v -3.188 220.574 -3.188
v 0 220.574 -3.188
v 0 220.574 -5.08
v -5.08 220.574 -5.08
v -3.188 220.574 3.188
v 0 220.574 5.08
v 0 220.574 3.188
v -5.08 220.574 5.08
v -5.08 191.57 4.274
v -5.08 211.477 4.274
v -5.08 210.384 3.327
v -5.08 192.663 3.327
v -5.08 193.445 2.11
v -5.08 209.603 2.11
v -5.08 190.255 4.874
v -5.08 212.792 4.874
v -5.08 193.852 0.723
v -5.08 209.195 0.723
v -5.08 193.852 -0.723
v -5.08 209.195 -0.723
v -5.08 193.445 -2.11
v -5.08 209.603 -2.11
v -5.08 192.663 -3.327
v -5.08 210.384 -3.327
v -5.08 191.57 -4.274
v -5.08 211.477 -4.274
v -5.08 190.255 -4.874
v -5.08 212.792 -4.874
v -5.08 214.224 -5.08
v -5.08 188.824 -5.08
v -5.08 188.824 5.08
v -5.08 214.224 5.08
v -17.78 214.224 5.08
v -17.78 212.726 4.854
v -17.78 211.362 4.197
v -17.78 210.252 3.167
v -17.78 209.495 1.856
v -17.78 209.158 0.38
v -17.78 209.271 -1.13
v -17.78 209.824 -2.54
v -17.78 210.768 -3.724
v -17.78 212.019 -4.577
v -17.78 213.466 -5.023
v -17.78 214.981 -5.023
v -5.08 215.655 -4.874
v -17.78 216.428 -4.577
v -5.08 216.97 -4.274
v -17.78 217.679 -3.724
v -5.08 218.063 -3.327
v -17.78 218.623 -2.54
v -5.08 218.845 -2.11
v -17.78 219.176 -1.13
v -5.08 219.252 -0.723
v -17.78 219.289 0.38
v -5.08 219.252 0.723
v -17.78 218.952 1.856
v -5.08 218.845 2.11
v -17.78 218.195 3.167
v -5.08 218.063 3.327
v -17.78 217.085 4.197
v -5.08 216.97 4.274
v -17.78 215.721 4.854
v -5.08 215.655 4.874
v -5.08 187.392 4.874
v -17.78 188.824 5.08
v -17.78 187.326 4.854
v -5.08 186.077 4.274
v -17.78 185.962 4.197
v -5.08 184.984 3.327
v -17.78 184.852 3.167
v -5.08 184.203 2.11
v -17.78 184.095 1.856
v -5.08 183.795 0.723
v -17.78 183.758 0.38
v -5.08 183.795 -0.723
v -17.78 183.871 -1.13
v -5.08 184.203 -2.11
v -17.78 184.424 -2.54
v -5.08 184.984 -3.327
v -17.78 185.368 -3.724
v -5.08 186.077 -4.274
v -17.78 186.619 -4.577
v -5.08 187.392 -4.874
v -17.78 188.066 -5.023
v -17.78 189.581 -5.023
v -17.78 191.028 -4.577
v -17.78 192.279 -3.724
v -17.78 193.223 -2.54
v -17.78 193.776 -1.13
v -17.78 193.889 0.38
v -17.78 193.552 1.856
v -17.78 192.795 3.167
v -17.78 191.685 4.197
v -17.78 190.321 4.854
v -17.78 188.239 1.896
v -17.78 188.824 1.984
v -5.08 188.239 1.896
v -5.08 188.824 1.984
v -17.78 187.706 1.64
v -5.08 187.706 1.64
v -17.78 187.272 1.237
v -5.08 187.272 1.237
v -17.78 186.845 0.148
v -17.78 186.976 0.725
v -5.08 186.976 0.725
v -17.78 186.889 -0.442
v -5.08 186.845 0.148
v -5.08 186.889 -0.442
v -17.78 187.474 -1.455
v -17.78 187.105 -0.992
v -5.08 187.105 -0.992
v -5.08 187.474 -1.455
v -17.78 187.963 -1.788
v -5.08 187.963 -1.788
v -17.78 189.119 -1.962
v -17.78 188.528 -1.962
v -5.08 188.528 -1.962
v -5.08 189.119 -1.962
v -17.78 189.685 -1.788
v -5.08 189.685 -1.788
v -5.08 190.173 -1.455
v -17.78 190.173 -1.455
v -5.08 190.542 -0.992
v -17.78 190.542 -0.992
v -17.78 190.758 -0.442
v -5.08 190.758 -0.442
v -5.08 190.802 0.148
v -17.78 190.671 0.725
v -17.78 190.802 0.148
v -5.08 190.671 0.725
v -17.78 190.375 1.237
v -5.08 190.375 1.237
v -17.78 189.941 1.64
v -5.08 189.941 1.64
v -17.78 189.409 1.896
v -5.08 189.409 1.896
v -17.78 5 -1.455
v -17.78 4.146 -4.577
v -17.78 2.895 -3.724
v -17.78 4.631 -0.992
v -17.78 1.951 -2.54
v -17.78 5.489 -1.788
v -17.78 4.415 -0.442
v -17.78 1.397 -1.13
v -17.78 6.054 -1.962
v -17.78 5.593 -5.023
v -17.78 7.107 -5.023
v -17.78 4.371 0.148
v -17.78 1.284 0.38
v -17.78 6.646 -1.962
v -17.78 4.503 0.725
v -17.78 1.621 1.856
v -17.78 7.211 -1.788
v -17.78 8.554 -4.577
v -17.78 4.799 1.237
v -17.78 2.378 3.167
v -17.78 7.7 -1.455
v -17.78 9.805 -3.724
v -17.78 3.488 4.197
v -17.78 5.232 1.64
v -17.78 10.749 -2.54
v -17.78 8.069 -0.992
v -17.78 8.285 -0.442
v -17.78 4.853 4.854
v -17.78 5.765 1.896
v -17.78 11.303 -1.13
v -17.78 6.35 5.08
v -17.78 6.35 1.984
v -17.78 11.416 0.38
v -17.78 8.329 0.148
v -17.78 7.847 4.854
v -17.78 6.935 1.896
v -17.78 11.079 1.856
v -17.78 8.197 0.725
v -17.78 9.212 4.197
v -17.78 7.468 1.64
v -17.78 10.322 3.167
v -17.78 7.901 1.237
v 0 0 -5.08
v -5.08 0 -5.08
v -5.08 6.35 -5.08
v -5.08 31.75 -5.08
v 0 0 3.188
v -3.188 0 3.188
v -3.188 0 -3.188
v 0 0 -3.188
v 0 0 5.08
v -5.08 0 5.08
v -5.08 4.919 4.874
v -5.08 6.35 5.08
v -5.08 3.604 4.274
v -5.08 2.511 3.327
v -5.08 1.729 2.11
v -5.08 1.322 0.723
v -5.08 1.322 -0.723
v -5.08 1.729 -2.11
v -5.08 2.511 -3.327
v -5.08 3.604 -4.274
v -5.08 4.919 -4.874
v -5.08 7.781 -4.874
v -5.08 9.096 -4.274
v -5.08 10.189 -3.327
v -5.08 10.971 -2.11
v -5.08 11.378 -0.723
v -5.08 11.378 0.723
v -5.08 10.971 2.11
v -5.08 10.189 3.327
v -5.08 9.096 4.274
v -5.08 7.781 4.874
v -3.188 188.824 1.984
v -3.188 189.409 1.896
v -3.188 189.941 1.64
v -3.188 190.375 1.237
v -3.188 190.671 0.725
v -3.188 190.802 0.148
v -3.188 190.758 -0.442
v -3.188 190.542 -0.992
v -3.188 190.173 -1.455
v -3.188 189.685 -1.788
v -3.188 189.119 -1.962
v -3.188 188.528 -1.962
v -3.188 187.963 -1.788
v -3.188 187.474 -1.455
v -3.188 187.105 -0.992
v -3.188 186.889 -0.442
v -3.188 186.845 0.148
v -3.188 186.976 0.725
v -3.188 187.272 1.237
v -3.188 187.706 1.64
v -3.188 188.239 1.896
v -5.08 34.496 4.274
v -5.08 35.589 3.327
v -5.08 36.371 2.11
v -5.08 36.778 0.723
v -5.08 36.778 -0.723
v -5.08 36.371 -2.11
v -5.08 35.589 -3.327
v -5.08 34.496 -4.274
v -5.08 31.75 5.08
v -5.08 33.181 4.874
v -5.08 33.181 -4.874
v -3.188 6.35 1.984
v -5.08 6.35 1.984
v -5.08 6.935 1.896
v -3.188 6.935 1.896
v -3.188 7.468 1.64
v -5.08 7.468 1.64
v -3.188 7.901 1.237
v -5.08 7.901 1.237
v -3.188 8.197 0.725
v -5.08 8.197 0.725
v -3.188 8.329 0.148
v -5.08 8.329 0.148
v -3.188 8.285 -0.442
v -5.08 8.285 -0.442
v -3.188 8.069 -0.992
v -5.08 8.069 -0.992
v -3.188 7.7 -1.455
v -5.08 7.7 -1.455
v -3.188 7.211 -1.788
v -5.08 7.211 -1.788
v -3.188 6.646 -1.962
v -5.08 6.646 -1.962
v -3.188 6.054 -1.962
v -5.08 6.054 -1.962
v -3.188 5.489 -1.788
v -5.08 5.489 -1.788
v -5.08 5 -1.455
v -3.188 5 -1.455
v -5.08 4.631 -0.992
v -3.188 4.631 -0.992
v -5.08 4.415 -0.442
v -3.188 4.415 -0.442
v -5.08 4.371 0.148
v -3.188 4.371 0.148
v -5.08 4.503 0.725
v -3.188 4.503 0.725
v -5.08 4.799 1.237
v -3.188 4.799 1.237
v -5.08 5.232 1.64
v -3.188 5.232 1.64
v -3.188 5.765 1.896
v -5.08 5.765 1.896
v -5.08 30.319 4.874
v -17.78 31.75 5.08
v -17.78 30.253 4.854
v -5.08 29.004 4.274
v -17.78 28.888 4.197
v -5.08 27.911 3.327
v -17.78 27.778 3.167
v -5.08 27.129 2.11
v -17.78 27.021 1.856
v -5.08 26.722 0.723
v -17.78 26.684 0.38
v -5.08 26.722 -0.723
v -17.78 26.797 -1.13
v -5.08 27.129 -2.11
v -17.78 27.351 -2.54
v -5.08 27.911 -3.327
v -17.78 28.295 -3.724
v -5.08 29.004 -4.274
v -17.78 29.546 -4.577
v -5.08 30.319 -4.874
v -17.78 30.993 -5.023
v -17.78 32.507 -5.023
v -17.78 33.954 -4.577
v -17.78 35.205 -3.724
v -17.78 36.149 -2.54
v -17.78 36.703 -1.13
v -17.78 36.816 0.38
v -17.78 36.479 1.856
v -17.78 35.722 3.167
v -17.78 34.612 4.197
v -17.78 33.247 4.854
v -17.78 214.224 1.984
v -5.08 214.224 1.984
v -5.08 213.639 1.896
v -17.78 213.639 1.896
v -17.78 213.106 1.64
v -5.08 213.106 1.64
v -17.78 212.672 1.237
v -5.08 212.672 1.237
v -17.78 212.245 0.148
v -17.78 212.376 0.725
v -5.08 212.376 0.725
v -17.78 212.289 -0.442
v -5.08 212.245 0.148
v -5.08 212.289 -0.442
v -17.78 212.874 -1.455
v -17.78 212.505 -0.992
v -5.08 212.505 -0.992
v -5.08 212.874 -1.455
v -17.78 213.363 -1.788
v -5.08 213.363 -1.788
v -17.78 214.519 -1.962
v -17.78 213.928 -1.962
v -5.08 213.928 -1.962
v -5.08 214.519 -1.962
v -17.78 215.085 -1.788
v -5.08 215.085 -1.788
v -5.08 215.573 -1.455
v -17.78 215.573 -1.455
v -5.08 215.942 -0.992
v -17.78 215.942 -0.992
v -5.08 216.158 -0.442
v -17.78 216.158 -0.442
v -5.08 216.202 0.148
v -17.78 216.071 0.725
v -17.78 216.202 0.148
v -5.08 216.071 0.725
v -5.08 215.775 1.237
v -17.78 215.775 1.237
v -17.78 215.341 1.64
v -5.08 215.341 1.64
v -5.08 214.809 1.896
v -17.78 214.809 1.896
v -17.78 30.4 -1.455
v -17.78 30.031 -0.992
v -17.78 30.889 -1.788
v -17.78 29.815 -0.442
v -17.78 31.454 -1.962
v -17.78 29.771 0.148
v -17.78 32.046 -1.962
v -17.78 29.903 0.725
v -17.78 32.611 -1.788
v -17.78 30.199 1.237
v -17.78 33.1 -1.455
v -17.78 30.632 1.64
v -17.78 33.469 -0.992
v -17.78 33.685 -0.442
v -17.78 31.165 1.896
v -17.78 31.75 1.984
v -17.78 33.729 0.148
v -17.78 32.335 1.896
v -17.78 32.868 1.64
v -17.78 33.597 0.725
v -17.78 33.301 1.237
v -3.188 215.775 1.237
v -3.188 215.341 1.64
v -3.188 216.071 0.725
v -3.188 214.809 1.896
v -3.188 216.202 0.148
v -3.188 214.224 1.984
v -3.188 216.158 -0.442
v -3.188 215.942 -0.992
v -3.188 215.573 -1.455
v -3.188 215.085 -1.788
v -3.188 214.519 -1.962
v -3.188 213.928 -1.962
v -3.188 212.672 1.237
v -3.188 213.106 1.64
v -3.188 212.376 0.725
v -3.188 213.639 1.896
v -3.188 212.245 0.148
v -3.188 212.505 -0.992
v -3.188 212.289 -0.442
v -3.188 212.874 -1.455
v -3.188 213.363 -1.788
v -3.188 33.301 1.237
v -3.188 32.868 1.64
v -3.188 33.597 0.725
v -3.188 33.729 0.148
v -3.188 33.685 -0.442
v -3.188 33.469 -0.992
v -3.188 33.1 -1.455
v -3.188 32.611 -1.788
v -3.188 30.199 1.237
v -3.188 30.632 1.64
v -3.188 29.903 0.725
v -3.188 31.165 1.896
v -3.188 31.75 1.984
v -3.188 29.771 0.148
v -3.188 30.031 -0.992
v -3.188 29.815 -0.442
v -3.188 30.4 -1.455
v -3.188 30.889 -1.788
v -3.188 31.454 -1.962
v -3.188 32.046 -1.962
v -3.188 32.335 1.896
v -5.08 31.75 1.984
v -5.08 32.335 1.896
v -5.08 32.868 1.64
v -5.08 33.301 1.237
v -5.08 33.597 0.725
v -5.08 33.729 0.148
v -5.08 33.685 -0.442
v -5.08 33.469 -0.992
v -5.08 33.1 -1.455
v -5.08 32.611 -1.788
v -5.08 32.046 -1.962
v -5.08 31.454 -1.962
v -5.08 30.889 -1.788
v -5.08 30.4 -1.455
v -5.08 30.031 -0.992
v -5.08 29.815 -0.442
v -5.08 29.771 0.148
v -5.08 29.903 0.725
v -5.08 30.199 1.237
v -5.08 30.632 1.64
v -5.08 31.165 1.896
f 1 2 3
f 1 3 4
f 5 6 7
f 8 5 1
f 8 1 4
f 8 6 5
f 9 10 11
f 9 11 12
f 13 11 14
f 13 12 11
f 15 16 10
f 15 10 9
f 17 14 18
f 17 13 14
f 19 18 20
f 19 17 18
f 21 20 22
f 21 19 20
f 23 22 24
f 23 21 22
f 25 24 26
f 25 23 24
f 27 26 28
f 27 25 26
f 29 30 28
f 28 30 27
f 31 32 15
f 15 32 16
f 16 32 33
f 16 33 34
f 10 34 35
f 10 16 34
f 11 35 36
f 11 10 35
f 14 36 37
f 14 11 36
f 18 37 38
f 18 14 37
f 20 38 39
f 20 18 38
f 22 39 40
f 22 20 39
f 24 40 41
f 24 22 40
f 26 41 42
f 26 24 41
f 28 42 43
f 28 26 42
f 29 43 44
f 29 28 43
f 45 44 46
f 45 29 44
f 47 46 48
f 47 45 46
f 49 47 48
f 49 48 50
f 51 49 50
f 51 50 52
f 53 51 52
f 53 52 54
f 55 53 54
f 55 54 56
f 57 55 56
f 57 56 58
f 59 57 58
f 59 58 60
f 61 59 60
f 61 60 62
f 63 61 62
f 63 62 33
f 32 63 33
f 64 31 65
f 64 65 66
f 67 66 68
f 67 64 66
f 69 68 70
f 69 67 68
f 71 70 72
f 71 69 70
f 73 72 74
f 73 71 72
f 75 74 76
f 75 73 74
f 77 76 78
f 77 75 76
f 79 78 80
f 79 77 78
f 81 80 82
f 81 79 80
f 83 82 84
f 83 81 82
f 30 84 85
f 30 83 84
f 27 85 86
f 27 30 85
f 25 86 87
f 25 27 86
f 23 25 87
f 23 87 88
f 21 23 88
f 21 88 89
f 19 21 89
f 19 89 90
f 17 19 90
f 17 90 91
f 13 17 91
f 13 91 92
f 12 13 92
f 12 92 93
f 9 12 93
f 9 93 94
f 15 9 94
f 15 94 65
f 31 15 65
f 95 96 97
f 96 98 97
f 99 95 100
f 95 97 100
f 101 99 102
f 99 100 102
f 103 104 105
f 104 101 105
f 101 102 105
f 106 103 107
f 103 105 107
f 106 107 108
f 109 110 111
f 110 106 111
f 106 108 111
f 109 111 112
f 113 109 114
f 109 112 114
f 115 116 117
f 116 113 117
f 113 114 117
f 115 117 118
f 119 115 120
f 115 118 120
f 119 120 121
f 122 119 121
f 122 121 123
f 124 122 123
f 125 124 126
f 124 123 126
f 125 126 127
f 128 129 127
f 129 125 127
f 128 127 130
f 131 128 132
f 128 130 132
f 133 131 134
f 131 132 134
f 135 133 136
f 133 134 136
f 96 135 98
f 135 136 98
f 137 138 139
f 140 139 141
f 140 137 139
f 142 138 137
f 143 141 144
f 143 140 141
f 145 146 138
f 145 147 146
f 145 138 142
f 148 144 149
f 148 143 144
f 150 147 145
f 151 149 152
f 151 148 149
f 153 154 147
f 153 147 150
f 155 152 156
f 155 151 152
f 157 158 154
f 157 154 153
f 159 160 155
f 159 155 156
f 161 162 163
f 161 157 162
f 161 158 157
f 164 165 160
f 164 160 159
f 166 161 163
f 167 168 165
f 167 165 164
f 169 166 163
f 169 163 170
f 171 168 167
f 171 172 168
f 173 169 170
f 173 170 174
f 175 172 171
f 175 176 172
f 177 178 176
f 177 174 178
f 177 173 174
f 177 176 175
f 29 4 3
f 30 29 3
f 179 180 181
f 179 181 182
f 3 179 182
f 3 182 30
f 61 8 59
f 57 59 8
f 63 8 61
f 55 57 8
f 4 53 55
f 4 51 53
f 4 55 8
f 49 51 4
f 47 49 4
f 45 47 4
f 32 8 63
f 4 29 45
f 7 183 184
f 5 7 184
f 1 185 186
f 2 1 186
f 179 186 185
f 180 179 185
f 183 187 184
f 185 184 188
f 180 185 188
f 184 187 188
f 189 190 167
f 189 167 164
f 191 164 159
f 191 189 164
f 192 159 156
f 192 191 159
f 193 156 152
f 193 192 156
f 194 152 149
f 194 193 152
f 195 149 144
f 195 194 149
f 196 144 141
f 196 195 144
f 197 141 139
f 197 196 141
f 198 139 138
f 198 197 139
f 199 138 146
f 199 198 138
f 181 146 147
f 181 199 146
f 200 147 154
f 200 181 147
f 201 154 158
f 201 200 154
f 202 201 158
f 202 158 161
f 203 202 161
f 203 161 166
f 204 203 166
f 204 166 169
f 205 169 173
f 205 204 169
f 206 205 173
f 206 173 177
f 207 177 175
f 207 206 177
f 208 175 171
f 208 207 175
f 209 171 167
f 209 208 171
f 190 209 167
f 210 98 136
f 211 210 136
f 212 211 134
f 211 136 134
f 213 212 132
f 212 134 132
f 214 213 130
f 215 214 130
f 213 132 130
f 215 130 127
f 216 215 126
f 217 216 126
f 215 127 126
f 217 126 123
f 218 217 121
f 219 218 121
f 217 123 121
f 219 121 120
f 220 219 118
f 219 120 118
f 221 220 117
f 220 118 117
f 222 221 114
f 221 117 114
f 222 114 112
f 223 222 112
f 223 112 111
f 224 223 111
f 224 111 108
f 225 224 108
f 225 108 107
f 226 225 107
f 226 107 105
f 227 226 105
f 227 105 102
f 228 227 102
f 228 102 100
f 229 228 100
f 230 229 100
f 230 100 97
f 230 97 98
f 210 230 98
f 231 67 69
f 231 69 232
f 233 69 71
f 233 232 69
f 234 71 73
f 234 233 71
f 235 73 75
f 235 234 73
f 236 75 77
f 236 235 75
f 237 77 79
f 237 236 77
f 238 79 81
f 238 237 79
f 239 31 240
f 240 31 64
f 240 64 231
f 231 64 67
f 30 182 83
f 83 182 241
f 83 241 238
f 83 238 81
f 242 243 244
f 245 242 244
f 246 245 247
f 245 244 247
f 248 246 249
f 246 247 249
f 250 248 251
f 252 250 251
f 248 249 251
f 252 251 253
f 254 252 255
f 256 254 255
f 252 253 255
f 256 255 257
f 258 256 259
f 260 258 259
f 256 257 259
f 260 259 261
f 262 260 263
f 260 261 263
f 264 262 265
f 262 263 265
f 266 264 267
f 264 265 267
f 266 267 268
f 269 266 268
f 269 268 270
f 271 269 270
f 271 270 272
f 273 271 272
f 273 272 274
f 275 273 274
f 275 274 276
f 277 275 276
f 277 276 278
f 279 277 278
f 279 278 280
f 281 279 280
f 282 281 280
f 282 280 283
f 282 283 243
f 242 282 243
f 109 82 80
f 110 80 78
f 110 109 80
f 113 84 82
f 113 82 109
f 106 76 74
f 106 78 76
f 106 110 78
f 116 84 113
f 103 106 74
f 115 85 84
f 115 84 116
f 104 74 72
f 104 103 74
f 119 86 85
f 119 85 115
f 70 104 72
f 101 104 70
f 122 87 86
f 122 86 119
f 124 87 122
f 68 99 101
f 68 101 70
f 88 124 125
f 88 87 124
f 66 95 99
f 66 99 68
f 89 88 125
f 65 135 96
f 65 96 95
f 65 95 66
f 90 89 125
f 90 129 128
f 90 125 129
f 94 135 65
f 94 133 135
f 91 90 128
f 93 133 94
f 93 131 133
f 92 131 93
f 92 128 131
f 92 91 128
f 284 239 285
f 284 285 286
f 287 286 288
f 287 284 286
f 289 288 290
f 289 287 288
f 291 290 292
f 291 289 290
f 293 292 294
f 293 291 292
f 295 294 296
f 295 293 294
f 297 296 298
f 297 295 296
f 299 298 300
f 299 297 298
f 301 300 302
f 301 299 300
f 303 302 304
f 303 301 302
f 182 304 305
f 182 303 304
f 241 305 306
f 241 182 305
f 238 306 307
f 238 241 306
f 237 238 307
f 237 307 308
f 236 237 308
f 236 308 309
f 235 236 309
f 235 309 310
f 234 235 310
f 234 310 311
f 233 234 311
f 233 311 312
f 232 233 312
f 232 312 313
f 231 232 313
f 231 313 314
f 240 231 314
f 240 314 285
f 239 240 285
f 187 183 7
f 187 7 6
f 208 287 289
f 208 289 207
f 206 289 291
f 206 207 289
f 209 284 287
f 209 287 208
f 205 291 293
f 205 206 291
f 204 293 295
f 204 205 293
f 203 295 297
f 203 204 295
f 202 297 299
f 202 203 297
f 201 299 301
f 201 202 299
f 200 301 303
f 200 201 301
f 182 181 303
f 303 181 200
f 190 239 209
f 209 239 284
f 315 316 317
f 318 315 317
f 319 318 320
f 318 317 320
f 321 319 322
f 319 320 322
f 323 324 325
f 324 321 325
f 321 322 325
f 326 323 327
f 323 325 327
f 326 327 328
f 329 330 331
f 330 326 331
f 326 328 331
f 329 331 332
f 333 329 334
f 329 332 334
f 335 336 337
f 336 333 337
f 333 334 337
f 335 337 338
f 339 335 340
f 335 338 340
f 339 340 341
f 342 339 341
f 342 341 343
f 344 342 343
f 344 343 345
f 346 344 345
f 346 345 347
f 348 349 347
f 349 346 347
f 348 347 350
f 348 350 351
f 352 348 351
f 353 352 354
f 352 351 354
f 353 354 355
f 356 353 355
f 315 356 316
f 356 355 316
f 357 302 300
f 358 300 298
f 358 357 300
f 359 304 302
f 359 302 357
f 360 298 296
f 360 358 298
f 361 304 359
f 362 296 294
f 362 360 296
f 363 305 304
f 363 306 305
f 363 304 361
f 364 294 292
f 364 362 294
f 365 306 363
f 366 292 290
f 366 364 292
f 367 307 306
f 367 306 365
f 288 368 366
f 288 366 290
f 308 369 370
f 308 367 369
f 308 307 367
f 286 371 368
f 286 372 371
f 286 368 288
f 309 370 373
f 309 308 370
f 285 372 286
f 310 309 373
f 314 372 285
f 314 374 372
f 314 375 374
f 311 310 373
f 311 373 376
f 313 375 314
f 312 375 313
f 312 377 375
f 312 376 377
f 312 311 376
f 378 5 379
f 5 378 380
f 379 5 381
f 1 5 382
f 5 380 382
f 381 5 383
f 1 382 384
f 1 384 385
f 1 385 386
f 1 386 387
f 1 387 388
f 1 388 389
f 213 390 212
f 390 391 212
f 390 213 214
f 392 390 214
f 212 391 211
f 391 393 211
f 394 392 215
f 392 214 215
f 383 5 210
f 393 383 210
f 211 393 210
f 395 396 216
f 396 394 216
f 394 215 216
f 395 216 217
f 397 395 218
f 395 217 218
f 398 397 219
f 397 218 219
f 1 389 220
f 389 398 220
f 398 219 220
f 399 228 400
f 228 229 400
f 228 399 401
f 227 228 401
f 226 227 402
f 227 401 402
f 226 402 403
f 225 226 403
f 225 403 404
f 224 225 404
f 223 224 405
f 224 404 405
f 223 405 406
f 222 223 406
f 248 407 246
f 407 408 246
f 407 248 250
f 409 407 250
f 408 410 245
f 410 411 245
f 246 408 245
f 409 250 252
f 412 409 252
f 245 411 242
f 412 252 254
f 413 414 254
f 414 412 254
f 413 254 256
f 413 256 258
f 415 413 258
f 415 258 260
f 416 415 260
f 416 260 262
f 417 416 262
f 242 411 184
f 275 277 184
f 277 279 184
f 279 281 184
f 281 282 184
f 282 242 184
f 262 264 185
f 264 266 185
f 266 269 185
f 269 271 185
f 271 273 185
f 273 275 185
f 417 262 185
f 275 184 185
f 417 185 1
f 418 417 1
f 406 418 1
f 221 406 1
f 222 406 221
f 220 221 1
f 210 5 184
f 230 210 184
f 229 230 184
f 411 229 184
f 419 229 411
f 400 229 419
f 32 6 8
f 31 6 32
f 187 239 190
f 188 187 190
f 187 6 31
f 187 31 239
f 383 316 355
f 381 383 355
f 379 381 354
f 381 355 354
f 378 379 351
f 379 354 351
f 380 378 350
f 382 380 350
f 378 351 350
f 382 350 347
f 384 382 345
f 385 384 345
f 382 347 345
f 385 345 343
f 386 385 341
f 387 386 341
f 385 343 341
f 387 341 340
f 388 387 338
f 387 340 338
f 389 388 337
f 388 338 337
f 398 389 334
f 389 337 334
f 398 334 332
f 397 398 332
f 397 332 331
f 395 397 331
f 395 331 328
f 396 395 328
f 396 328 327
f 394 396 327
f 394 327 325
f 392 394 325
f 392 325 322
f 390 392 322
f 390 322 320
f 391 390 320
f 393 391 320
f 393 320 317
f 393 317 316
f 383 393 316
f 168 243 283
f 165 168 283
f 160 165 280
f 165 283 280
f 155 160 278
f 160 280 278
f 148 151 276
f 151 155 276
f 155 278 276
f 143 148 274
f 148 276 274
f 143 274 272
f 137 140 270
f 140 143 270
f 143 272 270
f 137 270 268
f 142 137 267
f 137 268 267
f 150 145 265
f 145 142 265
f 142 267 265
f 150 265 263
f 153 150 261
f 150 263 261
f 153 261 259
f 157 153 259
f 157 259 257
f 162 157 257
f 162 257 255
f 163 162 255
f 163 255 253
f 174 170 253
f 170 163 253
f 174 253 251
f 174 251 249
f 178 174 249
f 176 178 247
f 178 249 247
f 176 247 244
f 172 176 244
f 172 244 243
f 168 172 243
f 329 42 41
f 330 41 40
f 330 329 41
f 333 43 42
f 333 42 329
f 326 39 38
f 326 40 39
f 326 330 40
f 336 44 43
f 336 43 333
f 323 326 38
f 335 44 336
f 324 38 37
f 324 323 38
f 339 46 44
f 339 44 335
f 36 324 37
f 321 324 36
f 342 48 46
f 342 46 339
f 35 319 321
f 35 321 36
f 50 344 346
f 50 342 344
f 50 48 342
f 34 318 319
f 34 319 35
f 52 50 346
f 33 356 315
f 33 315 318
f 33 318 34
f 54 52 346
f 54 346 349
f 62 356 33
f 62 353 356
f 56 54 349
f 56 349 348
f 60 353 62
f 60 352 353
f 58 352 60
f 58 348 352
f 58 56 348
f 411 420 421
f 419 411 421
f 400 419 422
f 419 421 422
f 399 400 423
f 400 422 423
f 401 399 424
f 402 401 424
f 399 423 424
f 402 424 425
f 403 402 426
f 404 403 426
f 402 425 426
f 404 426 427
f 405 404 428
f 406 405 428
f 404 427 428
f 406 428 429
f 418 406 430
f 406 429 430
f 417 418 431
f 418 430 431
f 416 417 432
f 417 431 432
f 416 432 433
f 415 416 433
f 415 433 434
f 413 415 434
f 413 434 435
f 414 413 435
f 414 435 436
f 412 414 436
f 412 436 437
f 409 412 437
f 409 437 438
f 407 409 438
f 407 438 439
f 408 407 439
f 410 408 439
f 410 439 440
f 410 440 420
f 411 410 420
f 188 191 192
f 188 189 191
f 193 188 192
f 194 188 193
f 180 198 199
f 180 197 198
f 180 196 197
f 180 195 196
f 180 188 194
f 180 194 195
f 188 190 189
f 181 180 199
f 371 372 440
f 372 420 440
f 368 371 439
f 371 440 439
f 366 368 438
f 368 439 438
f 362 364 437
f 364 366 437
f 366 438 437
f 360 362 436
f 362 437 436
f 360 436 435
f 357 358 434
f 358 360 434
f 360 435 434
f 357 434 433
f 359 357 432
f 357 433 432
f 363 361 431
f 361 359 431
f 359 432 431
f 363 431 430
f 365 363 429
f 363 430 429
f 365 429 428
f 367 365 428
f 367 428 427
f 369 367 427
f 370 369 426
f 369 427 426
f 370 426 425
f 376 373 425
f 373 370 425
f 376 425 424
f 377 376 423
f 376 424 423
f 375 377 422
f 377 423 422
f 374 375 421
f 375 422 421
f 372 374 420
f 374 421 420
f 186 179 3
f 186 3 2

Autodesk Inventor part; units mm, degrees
ref_plane "YZ Plane" through (0, 0, 0) normal (1, 0, 0) x (0, 1, 0)
ref_plane "XZ Plane" through (0, 0, 0) normal (0, 1, 0) x (-1, 0, 0)
ref_plane "XY Plane" through (0, 0, 0) normal (0, 0, 1) x (1, 0, 0)
sketch "Sketch1" plane through (0, 0, 0) normal (0, 1, 0) x (-1, 0, 0)
  line L0 (0, 3.1877) -> (3.1877, 3.1877)
  line L1 (3.1877, 3.1877) -> (3.1877, -3.1877)
  line L2 (3.1877, -3.1877) -> (0, -3.1877)
  line L3 (0, 5.08) -> (5.08, 5.08)
  line L4 (5.08, 5.08) -> (5.08, -5.08)
  line L5 (5.08, -5.08) -> (0, -5.08)
  line L6 (0, -5.08) -> (0, -3.1877)
  line L7 (0, 3.1877) -> (0, 5.08)
  point P0 (0, 0)
  dimension "d0" = 3.1877
  dimension "d1" = 6.3754
  dimension "d2" = 5.08
  dimension "d3" = 10.16
extrude "Extrusion1" add sketch "Sketch1" along normal blind 220.5736
sketch "Sketch2" plane through (-5.08, 0, -5.08) normal (-1, 0, 0) x (0, 0, 1)
  circle A0 centre (5.08, 6.35) radius 1.9844
  circle A1 centre (5.08, 214.2236) radius 1.9844
  circle A2 centre (5.08, 31.75) radius 1.9844
  circle A3 centre (5.08, 188.8236) radius 1.9844
  point P0 (5.08, 0)
  dimension "d6" = 3.9688
  dimension "d7" = 3.9688
  dimension "d12" = 3.9688
  dimension "d13" = 3.9688
sketch "Sketch3" plane through (-5.08, 0, -5.08) normal (-1, 0, 0) x (0, 0, 1)
  point P0 (5.08, 0)
extrude "Extrusion4" cut sketch "Sketch2" against normal blind 12.7
sketch "Sketch5" plane through (-5.08, 6.35, 0) normal (-1, 0, 0) x (0, 0, 1)
  circle A0 centre (0, 0) radius 1.9844 projected
  circle A1 centre (0, 25.4) radius 1.9844 projected
  circle A2 centre (0, 182.4736) radius 1.9844 projected
  circle A3 centre (0, 207.8736) radius 1.9844 projected
  circle A4 centre (0, 0) radius 5.08
  line L0 (-5.08, -6.35) -> (-5.08, 214.2236) projected
  circle A5 centre (0, 25.4) radius 5.08
  circle A6 centre (0, 207.8736) radius 5.08
  circle A7 centre (0, 182.4736) radius 5.08
  point P0 (0, -6.35)
extrude "Extrusion5" add sketch "Sketch5" along normal blind 12.7
properties part number "hs_intake_front_brace"
